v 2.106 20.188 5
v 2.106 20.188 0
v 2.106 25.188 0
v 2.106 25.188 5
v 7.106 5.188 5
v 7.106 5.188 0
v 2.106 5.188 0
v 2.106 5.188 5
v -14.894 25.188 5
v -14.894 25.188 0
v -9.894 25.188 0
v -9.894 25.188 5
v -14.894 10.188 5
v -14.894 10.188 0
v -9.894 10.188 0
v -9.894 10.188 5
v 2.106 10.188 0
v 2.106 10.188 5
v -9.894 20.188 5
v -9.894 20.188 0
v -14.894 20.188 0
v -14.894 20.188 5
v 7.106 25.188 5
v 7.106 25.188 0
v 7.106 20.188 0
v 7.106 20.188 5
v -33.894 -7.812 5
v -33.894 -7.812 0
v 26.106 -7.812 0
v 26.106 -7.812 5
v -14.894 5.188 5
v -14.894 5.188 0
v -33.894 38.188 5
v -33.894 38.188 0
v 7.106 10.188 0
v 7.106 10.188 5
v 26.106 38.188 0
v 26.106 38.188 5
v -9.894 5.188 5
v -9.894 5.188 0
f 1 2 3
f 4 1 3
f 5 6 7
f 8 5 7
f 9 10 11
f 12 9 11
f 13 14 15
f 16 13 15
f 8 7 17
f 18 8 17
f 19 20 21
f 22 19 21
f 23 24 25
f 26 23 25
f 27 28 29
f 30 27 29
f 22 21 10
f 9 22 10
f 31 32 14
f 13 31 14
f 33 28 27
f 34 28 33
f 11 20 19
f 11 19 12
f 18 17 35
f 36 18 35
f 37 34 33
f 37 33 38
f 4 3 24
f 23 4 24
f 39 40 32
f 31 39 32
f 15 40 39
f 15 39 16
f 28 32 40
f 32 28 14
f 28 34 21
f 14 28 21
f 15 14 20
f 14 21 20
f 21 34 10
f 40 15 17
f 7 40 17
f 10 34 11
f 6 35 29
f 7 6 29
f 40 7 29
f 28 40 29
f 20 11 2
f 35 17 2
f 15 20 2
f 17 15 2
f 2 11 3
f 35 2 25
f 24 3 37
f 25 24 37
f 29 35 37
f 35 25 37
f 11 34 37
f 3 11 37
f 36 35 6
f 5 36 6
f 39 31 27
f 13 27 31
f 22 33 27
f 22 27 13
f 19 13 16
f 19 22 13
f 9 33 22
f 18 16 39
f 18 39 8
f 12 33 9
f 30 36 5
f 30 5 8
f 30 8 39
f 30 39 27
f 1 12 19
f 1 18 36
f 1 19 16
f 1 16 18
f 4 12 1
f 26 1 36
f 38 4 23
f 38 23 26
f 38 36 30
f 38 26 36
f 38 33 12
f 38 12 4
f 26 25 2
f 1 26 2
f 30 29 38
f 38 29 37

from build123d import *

# Parameters (mm, degrees)
ESQUISSE1_W        = 60
ESQUISSE1_H        = 46
ESQUISSE1_W_2      = 12
ESQUISSE1_H_2      = 30
BOSS_EXTRU_1_DEPTH = 5


with BuildPart() as part:
    # Esquisse1 → Boss.-Extru.1 (new body)
    # profile 1 of 2: a face of its own
    with BuildSketch(Plane.XY):
        with Locations((-3.893592945, 15.1875)):
            Rectangle(ESQUISSE1_W, ESQUISSE1_H)
        Polygon((-14.893592945, 25.1875), (-9.893592945, 25.1875), (-9.893592945, 30.1875), (2.106407055, 30.1875), (2.106407055, 25.1875), (7.106407055, 25.1875), (7.106407055, 20.1875), (2.106407055, 20.1875), (2.106407055, 10.1875), (7.106407055, 10.1875), (7.106407055, 5.1875), (2.106407055, 5.1875), (2.106407055, 0.1875), (-9.893592945, 0.1875), (-9.893592945, 5.1875), (-14.893592945, 5.1875), (-14.893592945, 10.1875), (-9.893592945, 10.1875), (-9.893592945, 20.1875), (-14.893592945, 20.1875), align=None, mode=Mode.SUBTRACT)
    # profile 2 of 2: a face of its own
    with BuildSketch(Plane.XY):
        with Locations((-3.893592945, 15.1875)):
            Rectangle(ESQUISSE1_W_2, ESQUISSE1_H_2)
    extrude(amount=BOSS_EXTRU_1_DEPTH)


solid = part.part
